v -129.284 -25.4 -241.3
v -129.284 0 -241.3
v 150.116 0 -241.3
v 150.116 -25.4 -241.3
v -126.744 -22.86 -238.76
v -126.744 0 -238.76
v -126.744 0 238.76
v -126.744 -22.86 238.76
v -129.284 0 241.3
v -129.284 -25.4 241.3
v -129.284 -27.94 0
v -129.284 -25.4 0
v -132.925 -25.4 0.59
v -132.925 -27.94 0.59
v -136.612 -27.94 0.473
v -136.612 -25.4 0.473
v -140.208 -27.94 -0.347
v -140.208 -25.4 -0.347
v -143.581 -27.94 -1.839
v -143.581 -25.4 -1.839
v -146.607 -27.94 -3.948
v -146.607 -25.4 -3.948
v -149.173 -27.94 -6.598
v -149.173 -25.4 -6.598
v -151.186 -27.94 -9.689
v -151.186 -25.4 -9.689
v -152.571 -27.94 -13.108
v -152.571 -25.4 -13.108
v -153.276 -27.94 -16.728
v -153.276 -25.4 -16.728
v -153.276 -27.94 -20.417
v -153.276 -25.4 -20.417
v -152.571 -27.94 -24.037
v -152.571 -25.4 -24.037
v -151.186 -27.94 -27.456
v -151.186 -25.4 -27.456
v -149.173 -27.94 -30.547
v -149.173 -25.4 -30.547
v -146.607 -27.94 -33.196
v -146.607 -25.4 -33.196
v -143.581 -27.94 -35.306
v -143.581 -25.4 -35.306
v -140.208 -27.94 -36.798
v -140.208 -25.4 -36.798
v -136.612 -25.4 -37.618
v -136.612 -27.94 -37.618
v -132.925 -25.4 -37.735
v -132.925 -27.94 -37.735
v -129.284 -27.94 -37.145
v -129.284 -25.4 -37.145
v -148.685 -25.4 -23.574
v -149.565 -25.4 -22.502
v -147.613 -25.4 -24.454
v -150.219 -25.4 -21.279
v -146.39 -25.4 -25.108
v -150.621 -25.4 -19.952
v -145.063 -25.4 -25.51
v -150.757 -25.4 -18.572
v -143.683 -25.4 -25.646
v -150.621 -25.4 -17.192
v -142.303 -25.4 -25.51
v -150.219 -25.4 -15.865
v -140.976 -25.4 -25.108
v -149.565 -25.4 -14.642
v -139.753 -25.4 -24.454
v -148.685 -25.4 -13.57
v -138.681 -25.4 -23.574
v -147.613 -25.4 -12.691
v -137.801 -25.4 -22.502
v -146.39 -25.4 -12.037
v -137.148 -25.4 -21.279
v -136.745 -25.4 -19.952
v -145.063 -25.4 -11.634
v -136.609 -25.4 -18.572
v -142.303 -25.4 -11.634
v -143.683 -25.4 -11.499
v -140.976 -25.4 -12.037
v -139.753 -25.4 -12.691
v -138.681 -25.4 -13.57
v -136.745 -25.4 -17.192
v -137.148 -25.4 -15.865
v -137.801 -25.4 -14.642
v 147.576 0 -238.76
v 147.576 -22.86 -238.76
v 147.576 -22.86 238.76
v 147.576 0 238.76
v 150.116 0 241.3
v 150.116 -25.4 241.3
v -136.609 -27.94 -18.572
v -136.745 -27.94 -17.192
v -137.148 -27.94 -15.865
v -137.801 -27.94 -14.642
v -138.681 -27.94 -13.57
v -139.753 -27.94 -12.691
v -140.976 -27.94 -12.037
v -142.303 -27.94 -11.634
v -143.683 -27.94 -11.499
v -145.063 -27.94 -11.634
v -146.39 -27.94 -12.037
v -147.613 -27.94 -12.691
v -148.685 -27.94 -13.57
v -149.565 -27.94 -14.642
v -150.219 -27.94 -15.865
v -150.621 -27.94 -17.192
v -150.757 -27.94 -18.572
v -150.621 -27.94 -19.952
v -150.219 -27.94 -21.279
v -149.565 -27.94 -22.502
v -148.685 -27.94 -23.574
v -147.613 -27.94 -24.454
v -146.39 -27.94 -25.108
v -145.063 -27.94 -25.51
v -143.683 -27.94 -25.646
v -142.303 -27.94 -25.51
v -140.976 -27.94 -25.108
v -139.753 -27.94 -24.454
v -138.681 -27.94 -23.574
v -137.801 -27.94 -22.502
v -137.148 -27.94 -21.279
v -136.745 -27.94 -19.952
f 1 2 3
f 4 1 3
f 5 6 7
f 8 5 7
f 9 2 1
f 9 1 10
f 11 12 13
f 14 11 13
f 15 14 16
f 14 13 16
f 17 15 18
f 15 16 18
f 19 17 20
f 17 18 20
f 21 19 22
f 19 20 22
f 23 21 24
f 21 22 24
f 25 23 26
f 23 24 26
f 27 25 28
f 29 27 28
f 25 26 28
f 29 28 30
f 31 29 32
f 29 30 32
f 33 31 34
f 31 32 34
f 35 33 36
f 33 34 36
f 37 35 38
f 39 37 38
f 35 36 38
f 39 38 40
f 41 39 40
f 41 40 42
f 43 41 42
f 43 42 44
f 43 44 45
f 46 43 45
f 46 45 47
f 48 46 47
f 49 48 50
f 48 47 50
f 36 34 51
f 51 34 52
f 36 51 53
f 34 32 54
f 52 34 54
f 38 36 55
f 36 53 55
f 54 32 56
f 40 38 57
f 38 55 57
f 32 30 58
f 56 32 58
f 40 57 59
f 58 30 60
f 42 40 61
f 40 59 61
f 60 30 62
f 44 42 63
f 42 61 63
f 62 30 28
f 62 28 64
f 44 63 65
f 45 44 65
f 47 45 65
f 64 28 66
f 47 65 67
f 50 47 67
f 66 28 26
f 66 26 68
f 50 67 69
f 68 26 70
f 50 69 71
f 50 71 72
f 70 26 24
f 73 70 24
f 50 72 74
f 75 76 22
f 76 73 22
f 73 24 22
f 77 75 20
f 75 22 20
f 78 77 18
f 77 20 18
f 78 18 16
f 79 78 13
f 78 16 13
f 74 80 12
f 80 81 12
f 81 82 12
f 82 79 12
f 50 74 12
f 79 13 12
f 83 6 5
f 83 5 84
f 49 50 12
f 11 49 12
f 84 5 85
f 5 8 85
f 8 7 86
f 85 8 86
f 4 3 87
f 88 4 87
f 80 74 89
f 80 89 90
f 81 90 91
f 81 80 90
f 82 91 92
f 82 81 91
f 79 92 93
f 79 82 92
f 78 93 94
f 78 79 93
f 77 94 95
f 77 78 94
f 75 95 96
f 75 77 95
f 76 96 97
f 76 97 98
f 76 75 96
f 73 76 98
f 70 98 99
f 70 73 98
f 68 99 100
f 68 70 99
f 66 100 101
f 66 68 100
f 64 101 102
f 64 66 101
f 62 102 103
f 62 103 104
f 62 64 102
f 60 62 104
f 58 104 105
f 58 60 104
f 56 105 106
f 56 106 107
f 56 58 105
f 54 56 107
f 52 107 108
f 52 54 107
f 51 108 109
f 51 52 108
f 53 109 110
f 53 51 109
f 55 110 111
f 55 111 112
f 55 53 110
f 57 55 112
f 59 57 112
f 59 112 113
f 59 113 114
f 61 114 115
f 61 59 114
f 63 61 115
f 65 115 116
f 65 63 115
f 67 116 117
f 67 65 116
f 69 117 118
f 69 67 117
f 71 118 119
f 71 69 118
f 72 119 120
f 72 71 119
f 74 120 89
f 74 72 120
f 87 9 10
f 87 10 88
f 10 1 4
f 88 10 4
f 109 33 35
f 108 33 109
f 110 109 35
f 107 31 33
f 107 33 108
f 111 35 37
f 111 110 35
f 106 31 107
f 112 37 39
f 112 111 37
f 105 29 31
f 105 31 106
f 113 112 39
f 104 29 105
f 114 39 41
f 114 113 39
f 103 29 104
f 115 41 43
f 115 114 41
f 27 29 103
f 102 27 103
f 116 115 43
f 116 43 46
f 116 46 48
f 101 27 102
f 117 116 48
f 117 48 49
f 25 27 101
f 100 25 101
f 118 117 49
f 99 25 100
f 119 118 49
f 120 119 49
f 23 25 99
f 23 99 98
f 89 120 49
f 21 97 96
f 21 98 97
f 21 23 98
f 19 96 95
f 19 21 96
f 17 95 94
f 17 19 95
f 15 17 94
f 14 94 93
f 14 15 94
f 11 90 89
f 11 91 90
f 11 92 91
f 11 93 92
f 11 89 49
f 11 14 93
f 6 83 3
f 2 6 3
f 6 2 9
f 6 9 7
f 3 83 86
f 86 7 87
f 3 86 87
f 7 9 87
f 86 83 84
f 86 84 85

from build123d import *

# Parameters (mm, degrees)
F0_W     = 279.4
F0_H     = 482.6
F1_DEPTH = 25.4
F2_T     = -2.54
F3_R     = 7.0739
F4_DEPTH = 2.54


with BuildPart() as f1:
    # F0 (on Front) → F1 (new body)
    with BuildSketch(Plane.XZ):
        with Locations((10.4161884375, 0)):
            Rectangle(F0_W, F0_H)
    extrude(amount=F1_DEPTH)

    # F2
    f2_openings = [f1.faces().sort_by_distance(p)[0] for p in [
        (10.416188, 0, 0),
    ]]
    offset(amount=F2_T, openings=f2_openings)


with BuildPart() as f4:
    # F3 (on face) → F4 (new body)
    with BuildSketch(Plane.XZ.offset(25.4)):
        with BuildLine():
            Line((-129.2838115625, -37.1448050436), (-129.2838115625, 0))
            ThreePointArc((-129.2838115625, 0), (-153.3645340536, -18.5724025218), (-129.2838115625, -37.1448050436))
        make_face()
        with Locations((-143.6831951141, -18.5724025218)):
            Circle(F3_R, mode=Mode.SUBTRACT)
    extrude(amount=F4_DEPTH)


solid = Compound([f1.part, f4.part])
